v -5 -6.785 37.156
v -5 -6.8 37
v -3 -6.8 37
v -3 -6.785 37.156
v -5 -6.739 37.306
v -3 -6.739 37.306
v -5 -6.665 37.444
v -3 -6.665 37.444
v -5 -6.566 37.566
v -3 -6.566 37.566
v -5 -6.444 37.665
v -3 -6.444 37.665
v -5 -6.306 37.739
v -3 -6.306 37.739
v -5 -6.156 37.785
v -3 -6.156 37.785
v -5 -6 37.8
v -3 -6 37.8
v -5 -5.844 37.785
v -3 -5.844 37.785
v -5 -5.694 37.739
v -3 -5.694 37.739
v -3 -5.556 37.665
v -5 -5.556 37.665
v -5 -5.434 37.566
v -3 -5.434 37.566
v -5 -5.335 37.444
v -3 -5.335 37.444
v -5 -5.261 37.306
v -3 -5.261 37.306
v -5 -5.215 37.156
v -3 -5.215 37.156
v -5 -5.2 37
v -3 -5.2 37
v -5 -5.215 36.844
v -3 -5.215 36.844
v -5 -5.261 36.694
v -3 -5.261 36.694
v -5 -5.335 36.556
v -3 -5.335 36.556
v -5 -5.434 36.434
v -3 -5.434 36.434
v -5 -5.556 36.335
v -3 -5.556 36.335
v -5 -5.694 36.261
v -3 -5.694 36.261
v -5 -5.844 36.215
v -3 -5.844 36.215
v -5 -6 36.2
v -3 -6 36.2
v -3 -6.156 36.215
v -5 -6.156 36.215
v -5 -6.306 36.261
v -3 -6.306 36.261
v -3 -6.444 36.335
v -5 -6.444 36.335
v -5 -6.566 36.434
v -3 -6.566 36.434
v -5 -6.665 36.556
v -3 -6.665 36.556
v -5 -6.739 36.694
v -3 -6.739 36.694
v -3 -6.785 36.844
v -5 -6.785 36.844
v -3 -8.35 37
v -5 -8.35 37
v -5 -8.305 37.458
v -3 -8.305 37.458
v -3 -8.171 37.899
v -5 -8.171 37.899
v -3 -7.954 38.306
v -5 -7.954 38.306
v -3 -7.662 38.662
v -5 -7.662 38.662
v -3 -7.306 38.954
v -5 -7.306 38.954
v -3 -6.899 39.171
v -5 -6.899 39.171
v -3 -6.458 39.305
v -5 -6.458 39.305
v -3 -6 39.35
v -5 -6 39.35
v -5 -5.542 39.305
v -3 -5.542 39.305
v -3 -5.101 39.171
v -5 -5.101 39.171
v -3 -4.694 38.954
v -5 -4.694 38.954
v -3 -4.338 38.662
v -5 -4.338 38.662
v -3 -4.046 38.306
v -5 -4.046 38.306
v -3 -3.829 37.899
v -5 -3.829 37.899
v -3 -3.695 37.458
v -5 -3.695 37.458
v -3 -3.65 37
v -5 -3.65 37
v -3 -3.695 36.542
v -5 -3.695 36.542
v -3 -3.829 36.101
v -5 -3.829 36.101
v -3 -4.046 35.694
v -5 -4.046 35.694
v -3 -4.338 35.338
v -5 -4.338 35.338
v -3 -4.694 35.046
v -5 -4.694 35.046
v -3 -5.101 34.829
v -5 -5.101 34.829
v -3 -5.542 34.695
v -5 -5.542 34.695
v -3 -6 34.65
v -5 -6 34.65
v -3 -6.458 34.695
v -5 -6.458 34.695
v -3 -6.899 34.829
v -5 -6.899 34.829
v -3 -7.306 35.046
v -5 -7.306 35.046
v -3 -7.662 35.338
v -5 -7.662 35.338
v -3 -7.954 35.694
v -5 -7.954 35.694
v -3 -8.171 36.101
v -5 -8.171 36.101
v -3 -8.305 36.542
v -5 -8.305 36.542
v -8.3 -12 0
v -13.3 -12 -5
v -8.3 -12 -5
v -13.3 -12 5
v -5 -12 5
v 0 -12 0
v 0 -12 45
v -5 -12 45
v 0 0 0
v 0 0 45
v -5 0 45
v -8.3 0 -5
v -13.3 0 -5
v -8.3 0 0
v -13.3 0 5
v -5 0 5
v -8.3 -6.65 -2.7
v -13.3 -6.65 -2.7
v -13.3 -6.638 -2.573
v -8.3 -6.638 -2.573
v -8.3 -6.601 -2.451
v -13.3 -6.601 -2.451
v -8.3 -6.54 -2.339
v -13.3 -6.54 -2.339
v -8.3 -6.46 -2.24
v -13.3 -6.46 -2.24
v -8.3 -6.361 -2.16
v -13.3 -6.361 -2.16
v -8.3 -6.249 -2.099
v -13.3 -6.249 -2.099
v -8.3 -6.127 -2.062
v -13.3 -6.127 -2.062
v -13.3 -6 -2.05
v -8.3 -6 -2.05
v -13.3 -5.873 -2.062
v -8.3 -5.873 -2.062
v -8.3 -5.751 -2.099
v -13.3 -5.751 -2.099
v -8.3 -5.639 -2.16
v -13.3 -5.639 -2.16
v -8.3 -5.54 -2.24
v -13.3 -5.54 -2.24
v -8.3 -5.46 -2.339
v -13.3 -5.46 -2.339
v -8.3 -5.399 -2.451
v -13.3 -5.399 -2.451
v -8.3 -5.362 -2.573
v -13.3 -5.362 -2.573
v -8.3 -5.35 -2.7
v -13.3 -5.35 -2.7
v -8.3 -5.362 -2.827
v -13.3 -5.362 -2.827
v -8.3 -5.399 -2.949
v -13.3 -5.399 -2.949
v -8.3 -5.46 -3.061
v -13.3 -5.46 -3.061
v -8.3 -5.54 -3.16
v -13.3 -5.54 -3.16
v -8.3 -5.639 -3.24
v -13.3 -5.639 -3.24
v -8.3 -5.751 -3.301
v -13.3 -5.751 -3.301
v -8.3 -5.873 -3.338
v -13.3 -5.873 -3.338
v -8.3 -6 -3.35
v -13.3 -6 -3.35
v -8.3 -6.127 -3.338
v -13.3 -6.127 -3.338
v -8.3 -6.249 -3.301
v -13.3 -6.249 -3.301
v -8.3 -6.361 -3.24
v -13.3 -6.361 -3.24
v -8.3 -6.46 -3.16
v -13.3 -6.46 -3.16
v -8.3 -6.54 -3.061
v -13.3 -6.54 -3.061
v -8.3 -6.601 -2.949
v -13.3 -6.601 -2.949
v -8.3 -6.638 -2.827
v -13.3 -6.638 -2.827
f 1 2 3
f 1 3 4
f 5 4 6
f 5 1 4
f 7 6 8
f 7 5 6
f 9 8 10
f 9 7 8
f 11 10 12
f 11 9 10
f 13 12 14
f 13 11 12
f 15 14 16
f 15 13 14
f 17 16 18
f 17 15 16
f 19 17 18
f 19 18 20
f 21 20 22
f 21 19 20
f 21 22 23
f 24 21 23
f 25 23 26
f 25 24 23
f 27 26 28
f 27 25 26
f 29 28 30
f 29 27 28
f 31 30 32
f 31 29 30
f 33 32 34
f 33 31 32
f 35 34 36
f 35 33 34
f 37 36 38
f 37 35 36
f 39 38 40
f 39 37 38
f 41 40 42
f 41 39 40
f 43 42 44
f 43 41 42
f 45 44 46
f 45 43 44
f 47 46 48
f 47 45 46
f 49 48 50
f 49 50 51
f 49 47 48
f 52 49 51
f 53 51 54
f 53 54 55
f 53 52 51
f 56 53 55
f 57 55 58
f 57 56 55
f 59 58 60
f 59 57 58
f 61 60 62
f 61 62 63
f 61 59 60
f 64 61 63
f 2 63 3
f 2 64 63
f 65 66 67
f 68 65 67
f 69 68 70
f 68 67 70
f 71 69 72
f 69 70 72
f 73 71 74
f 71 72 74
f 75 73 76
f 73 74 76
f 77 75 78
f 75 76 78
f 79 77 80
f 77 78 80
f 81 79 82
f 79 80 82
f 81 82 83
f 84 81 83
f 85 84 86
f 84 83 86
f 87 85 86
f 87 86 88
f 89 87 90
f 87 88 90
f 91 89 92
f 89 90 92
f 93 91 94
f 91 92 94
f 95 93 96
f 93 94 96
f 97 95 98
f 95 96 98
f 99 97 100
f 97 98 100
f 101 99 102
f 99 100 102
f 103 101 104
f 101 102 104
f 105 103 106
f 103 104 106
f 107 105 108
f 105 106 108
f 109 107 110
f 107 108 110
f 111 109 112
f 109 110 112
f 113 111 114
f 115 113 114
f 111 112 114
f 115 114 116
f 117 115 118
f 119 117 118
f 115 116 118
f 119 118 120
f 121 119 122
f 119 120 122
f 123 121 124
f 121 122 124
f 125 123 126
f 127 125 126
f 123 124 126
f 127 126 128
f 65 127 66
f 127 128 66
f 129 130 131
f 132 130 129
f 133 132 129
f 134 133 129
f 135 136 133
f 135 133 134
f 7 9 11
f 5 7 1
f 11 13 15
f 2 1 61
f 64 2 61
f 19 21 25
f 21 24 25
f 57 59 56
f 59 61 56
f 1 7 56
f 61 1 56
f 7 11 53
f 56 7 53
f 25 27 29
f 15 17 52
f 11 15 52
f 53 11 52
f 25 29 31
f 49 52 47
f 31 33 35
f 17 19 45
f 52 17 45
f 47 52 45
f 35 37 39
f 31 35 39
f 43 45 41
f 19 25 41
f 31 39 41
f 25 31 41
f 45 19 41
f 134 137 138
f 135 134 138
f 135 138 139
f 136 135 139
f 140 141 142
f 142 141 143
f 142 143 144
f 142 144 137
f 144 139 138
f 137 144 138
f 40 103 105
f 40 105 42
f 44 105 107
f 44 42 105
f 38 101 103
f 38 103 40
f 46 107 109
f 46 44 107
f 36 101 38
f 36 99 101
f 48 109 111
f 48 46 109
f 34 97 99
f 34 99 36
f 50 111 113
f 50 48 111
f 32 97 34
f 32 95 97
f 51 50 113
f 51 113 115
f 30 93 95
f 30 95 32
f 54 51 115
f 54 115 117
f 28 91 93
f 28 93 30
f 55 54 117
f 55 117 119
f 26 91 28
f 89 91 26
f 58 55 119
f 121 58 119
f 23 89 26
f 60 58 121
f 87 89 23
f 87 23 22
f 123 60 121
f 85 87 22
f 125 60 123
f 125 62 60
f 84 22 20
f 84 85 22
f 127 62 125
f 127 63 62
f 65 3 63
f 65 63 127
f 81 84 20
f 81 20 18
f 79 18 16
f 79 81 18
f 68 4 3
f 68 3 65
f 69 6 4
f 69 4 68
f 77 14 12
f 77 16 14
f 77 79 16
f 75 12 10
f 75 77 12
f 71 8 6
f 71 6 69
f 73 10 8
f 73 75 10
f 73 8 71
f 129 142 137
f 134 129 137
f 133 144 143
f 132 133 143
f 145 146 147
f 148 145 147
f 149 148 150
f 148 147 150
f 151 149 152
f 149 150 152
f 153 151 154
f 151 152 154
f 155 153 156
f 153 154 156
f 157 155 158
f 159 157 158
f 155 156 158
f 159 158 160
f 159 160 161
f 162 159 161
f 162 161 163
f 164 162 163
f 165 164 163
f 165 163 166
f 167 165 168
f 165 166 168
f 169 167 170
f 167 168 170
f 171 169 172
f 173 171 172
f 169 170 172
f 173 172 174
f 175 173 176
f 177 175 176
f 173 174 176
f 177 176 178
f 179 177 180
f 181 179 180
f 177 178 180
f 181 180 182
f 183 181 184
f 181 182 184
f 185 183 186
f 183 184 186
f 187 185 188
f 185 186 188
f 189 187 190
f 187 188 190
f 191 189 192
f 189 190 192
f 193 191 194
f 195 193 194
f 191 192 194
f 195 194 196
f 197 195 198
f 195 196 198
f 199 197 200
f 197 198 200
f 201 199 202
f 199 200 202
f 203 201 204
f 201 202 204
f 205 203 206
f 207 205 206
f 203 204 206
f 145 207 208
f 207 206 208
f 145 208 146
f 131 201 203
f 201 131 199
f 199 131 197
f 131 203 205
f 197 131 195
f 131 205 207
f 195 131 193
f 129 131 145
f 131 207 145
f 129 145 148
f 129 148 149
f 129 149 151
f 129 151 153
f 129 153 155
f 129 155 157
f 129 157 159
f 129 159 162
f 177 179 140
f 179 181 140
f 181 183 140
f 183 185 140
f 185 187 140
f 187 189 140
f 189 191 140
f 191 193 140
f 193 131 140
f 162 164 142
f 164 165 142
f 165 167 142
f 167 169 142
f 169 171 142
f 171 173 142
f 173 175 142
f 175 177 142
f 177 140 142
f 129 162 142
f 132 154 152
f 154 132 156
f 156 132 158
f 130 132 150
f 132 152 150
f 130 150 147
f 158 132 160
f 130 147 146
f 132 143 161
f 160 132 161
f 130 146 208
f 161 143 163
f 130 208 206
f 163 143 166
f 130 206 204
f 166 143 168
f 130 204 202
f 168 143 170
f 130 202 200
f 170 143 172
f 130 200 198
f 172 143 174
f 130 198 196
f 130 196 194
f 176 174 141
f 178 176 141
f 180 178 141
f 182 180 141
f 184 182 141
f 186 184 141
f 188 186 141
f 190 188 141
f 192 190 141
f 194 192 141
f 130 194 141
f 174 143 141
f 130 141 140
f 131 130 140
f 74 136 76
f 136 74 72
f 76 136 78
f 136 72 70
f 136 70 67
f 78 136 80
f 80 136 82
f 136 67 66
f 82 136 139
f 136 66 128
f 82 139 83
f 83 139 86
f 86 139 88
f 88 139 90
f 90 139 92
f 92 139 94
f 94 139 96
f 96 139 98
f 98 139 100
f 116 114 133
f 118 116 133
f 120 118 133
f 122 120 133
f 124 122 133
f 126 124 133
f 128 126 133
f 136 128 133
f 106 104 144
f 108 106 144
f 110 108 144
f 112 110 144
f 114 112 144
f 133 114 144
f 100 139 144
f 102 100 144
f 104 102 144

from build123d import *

# Parameters (mm, degrees)
F1_DEPTH = 12
F2_R     = 0.65
F3_DEPTH = 5
F4_R     = 2.35
F4_R_2   = 0.8
F5_DEPTH = 2


with BuildPart() as f1:
    # F0 (on Front) → F1 (new body)
    with BuildSketch(Plane.XZ):
        Polygon((-13.3, 5), (-13.3, -5), (-8.3, -5), (-8.3, 0), (0, 0), (0, 45), (-5, 45), (-5, 5), align=None)
    extrude(amount=F1_DEPTH)

    # F2 (on face) → F3 (cut)
    with BuildSketch(Plane(origin=(-13.3, 0, 0), x_dir=(0, -1, 0), z_dir=(-1, 0, 0))):
        with Locations((6, -2.7)):
            Circle(F2_R)
    extrude(amount=-F3_DEPTH, mode=Mode.SUBTRACT)

    # F4 (on face) → F5 (cut)
    with BuildSketch(Plane(origin=(-5, 0, 0), x_dir=(0, -1, 0), z_dir=(-1, 0, 0))):
        with Locations((6, 37)):
            Circle(F4_R)
        with Locations((6, 37)):
            Circle(F4_R_2, mode=Mode.SUBTRACT)
    extrude(amount=-F5_DEPTH, mode=Mode.SUBTRACT)


solid = f1.part
